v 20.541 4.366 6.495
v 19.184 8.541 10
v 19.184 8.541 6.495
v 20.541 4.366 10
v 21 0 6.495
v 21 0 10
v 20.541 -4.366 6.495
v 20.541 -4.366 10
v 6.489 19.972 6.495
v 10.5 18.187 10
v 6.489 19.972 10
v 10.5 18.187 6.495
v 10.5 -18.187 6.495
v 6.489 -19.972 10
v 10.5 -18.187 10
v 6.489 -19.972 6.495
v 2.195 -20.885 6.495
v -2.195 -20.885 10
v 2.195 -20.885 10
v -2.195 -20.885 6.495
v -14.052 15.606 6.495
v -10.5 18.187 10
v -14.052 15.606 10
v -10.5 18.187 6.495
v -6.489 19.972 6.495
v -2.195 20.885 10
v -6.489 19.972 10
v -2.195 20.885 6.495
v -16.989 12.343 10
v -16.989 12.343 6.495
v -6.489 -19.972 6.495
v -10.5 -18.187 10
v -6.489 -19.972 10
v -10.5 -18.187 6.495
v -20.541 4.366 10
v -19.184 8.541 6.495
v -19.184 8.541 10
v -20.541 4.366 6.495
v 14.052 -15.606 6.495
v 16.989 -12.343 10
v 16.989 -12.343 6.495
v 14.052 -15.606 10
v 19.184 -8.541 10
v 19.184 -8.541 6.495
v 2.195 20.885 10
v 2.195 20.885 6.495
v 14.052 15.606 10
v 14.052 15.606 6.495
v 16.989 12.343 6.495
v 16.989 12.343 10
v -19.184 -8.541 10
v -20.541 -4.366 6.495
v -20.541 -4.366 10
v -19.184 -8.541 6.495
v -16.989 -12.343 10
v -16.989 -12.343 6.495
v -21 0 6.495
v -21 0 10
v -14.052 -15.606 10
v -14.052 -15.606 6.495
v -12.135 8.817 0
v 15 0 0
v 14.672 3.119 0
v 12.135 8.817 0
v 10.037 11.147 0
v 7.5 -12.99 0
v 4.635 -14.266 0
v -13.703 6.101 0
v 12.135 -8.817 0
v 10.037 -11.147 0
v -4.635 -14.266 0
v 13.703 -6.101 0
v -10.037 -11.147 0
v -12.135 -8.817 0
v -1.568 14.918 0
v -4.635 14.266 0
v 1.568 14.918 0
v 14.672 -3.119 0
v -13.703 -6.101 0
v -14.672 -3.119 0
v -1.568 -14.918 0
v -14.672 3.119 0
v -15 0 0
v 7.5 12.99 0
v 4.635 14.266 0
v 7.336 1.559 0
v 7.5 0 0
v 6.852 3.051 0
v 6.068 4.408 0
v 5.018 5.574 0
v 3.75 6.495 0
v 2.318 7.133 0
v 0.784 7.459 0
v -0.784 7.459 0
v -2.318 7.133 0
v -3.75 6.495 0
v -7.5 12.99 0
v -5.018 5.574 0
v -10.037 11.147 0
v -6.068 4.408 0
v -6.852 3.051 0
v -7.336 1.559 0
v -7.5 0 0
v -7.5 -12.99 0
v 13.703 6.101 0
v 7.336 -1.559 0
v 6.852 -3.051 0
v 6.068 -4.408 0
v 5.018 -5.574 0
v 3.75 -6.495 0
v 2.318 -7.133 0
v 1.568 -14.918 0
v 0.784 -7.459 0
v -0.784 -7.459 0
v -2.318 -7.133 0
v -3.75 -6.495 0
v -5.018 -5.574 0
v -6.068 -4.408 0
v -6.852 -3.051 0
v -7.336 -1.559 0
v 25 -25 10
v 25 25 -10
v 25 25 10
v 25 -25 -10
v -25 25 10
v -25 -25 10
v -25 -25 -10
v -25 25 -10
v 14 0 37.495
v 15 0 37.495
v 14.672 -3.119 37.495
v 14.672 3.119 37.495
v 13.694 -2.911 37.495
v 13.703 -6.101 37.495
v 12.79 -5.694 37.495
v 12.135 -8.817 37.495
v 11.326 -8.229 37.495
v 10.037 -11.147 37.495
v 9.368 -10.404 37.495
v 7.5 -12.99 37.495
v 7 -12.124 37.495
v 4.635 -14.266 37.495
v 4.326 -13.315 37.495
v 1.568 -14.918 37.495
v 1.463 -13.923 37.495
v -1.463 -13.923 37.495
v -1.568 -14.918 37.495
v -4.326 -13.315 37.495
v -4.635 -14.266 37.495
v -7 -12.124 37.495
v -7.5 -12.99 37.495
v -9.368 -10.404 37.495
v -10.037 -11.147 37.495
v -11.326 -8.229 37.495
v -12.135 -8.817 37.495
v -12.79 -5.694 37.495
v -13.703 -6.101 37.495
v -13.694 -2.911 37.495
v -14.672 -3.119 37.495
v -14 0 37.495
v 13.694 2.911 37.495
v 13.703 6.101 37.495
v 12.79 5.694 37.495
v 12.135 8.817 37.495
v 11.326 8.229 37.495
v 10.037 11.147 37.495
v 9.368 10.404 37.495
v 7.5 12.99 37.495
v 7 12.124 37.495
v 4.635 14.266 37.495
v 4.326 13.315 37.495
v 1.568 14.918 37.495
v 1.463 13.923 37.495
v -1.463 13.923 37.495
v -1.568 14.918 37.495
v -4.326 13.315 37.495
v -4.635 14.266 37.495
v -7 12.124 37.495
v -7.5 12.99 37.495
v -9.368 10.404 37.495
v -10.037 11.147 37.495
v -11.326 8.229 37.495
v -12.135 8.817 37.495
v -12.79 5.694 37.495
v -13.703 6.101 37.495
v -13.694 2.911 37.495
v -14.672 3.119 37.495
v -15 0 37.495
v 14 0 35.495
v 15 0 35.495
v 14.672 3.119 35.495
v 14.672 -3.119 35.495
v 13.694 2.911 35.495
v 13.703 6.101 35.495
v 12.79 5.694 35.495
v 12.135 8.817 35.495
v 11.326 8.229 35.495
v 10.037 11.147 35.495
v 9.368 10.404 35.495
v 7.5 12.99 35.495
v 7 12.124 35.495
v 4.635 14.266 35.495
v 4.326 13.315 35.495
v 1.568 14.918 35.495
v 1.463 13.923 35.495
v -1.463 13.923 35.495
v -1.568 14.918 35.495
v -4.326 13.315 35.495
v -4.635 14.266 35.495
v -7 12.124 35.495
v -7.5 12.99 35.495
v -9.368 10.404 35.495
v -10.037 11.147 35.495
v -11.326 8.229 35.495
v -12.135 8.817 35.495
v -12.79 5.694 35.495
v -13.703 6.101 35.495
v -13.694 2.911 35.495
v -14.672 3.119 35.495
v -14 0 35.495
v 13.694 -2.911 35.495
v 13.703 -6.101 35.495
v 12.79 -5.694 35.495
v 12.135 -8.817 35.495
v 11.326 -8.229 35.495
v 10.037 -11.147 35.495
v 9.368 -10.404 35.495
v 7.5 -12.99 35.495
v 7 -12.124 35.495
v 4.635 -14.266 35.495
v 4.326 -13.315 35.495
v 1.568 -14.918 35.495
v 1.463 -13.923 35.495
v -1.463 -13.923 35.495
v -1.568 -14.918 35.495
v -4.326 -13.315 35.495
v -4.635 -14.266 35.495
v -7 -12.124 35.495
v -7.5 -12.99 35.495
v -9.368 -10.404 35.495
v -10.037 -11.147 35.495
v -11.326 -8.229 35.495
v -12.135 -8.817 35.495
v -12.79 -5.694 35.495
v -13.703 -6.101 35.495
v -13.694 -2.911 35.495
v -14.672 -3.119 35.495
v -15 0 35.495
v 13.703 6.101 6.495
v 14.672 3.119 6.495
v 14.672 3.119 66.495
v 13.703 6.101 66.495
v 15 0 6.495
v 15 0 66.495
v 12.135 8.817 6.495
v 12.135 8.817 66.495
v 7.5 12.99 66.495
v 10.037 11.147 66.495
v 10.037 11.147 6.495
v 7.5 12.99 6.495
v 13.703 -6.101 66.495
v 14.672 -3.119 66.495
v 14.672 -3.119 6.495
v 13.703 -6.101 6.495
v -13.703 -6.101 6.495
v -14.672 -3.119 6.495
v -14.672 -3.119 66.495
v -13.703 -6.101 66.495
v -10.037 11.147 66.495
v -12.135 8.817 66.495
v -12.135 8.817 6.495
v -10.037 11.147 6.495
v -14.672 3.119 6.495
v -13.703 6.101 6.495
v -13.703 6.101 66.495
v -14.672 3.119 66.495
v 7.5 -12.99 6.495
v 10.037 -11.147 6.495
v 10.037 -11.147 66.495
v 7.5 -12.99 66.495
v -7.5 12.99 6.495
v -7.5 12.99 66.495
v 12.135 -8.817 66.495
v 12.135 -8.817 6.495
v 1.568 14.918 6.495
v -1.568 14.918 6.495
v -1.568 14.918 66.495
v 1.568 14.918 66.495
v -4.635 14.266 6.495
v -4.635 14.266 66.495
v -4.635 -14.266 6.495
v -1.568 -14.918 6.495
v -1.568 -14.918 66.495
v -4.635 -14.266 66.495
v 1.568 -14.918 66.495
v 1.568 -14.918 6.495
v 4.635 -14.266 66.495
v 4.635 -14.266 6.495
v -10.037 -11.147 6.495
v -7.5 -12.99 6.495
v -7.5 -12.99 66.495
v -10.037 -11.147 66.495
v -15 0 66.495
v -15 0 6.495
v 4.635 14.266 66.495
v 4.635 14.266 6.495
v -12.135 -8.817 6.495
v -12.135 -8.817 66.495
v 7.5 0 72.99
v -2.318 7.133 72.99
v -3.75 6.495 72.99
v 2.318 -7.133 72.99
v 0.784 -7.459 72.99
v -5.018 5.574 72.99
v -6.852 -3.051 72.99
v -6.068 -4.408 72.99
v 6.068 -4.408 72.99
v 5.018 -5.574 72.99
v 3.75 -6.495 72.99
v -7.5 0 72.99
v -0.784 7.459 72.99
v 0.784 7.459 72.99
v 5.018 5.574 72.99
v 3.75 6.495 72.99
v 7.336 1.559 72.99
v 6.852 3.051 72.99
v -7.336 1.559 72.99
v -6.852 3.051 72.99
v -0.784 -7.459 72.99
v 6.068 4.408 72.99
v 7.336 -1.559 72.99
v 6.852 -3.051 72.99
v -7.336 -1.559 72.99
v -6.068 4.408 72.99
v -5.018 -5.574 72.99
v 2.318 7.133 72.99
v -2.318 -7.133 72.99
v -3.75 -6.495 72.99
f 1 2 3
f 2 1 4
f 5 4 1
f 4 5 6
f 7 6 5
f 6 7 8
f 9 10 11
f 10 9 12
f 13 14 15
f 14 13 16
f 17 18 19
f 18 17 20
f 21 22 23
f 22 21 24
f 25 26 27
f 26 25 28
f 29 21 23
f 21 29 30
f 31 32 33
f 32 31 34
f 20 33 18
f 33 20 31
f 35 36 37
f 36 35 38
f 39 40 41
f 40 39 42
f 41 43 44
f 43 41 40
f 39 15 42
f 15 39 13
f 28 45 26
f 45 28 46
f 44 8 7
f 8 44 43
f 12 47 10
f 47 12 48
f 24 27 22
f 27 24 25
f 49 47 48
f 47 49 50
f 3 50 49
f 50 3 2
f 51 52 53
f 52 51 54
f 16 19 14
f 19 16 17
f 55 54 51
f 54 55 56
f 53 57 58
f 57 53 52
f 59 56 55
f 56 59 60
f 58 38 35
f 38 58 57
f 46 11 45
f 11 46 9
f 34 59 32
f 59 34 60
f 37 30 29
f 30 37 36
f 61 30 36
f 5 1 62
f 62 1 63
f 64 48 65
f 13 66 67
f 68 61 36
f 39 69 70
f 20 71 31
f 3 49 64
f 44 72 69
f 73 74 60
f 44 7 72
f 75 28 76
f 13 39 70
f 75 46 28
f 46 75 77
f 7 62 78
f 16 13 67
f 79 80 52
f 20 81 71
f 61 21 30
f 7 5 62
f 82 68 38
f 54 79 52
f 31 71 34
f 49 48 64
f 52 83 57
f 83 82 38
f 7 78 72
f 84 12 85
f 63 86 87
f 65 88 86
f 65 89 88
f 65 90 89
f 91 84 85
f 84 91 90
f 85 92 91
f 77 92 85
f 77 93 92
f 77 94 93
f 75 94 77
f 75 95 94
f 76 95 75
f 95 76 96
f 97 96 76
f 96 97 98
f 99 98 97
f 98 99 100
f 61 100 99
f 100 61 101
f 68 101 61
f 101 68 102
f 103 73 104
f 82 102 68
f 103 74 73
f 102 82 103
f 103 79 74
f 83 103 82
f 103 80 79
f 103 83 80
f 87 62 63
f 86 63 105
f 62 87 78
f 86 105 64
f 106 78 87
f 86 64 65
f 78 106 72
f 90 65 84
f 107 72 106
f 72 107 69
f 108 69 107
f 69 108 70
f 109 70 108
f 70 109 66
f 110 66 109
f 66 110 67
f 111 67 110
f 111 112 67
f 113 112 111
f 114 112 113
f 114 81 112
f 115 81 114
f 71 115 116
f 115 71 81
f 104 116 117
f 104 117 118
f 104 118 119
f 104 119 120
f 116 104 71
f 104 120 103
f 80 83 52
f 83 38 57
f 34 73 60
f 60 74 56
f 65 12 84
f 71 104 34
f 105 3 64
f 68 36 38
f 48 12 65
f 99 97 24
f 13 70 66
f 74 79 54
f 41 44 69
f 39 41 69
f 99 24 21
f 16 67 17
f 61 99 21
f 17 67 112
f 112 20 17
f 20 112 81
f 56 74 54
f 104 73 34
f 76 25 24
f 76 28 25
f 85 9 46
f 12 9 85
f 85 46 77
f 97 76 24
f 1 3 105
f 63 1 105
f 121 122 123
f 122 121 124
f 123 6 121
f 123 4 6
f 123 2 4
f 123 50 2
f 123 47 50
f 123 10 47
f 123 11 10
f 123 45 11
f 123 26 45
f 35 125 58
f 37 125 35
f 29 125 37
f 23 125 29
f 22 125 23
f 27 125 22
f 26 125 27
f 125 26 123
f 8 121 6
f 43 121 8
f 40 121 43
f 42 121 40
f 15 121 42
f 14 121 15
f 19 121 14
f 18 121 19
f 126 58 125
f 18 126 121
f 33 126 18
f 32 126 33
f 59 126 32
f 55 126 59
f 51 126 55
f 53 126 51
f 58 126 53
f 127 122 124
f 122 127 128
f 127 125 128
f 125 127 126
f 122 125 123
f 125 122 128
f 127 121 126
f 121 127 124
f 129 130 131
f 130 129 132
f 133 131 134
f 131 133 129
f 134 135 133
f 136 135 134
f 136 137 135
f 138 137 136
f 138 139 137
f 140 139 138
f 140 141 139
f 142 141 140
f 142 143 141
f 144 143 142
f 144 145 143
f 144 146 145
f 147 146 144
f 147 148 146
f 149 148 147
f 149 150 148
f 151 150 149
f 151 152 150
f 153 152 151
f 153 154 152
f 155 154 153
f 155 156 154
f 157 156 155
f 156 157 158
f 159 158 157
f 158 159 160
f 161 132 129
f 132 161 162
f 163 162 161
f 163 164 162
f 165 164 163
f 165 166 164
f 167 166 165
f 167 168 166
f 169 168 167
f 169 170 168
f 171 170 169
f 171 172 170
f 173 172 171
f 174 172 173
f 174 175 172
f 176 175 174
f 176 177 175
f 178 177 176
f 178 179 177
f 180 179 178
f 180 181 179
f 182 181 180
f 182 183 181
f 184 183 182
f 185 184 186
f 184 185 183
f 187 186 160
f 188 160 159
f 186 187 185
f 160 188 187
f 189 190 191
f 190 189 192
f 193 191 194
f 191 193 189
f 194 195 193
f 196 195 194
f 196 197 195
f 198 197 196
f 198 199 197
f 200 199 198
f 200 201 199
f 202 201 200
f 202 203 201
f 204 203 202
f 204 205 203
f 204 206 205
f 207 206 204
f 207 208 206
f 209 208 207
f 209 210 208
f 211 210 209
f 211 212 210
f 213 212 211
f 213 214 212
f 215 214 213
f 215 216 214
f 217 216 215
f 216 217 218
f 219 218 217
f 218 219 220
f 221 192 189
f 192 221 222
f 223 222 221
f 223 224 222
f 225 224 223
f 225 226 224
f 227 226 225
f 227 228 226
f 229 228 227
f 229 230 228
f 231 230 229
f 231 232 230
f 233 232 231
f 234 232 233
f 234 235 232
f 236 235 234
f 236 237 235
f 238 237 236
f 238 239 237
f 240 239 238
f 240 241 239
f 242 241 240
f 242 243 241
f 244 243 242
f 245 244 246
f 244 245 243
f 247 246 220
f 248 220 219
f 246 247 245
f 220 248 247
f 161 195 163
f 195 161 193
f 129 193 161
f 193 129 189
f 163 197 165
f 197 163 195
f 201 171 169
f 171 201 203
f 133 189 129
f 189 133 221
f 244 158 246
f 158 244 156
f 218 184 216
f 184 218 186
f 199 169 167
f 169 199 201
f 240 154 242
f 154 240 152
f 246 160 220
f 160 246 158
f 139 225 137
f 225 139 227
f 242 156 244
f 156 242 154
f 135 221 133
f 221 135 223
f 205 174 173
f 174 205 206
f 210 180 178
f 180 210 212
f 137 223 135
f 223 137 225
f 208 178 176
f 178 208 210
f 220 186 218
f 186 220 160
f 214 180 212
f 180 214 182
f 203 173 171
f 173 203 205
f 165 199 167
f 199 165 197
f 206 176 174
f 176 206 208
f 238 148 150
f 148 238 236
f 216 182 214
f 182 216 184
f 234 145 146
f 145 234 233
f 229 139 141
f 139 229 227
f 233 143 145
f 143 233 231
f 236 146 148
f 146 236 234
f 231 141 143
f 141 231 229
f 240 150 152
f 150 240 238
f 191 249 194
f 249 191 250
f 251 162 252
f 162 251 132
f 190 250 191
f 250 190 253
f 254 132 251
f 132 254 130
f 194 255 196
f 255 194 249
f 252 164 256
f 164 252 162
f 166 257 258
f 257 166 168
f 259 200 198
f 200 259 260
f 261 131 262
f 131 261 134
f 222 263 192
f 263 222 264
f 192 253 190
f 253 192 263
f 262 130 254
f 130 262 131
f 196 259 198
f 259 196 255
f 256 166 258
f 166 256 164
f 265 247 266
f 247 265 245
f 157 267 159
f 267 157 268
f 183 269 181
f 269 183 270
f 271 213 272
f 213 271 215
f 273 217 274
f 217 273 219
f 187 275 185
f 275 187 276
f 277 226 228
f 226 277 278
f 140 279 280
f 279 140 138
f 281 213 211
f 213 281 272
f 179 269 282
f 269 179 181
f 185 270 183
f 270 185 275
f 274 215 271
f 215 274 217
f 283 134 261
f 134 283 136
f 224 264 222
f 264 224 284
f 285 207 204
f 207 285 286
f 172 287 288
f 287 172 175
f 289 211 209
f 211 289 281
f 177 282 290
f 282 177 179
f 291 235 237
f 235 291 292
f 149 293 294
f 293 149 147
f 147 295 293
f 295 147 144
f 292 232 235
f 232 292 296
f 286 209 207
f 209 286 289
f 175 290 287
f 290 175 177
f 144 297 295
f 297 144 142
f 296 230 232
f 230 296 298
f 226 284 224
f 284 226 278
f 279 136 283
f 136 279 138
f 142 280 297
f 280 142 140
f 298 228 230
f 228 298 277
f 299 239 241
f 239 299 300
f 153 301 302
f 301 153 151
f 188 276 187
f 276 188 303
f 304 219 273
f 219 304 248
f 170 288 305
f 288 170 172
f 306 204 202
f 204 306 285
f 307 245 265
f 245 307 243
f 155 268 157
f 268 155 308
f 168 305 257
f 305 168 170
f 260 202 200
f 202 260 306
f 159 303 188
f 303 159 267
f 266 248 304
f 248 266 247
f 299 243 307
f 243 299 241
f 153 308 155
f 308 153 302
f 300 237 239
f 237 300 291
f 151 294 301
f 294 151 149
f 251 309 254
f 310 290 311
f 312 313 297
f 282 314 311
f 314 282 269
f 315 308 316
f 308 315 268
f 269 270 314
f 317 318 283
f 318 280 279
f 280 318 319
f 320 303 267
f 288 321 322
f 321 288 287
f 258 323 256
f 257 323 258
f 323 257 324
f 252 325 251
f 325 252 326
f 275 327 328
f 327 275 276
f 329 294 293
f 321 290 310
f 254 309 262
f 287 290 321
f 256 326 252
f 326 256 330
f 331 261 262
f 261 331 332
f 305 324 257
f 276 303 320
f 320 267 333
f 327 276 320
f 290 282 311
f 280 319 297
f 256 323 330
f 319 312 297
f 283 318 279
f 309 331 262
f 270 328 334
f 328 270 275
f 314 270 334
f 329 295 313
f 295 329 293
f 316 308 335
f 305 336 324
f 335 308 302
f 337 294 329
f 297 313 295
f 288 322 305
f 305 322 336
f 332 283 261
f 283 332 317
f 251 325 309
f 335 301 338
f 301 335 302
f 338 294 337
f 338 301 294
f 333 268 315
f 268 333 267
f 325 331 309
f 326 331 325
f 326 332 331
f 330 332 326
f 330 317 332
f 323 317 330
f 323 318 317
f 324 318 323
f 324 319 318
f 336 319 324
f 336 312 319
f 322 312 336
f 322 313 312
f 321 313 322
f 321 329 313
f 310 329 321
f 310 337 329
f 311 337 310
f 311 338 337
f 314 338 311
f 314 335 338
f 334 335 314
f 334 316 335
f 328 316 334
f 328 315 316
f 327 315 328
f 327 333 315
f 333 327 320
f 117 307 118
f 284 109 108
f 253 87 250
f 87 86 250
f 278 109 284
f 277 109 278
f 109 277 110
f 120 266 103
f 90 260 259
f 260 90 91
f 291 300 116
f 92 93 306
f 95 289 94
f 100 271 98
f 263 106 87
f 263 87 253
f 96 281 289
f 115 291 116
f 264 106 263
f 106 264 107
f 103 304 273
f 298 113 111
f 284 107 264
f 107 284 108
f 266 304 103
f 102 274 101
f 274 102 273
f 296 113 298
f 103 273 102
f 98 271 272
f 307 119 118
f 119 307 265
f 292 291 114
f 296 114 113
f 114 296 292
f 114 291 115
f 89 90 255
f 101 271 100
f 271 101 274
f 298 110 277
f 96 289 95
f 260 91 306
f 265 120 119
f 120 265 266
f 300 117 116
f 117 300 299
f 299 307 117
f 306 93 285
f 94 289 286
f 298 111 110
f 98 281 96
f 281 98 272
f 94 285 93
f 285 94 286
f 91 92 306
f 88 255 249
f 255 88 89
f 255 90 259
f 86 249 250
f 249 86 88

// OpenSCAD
include <MCAD/units.scad>

can_diameter = 30;
can_length = 60;

band_width = 2;
band_depth = 1;
band_location = can_length - can_diameter;

endcap_half_angle = 30;
endcap_height = can_diameter / (8 * tan(endcap_half_angle));

can_angles = [-120, 0, 28];
can_location = [-30, 18, 0];

module can_isolated() {
    translate([0, 0, endcap_height]) {
        difference() {
            cylinder(d = can_diameter, h = can_length);

            translate([0, 0, band_location])
            difference() {
                cylinder(d = can_diameter * 1.2, h = band_width, center = true);
                cylinder(d = can_diameter - 2 * band_depth, h = band_width * 3, center = true);
            }
        }

        // Endcap
        translate([0, 0, can_length])
            cylinder(d1 = can_diameter, d2 = can_diameter / 2, h = endcap_height);

        // Root cap
        translate([0, 0, -endcap_height])
            cylinder(d1 = can_diameter / 2, d2 = can_diameter, h = endcap_height);
    }
}

module can_socket_isolated() {
        translate([0, 0, endcap_height]) {
            cylinder(d = can_diameter * 1.4, h = can_length * 1.5);
            translate([0, 0, -endcap_height])
                cylinder(d1 = can_diameter, d2 = can_diameter * 1.4, h = endcap_height);
        }
}

module can() {
    translate(can_location)
    rotate(can_angles)
    translate([0, 0, can_length / 4])
        can_isolated();
}

module can_socket() {
    translate(can_location)
    rotate(can_angles)
    translate([0, 0, can_length / 4])
        can_socket_isolated();
}

difference() {
    cube([50, 50, 20], center = true);
    can_socket_isolated();
}

can_isolated();
